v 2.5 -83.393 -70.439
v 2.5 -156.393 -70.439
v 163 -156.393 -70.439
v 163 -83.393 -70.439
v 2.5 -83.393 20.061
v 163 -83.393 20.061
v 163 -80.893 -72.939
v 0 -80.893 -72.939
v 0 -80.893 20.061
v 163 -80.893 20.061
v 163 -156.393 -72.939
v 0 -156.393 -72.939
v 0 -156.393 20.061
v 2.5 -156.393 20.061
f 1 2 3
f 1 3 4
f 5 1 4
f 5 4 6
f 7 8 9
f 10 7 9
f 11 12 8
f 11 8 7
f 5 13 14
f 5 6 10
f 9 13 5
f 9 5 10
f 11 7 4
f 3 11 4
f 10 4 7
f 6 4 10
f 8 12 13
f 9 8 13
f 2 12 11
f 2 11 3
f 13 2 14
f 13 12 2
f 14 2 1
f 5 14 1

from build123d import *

# Parameters (mm, degrees)
F0_W     = 78
F0_H     = 93
F1_DEPTH = 163
F2_T     = -2.5
F3_DEPTH = 2.5
F4_DEPTH = 2.5
F5_DEPTH = 25


with BuildPart() as f1:
    # F0 (on Right) → F1 (new body)
    with BuildSketch(Plane.YZ):
        with Locations((-119.8926544255, -26.4388019443)):
            Rectangle(F0_W, F0_H)
    extrude(amount=F1_DEPTH)

    # F2
    f2_openings = [f1.faces().sort_by_distance(p)[0] for p in [
        (81.5, -119.892654, 20.061198),
    ]]
    offset(amount=F2_T, openings=f2_openings)

    # F3 (add): a face of the model
    f3_faces = [f1.faces().sort_by_distance(p)[0] for p in [
        (81.5, -158.8926544255, -26.4388019443),
    ]]
    extrude(f3_faces, amount=-F3_DEPTH)

    # F4 (cut): a face of the model
    f4_faces = [f1.faces().sort_by_distance(p)[0] for p in [
        (81.5, -158.8926544255, -26.4388019443),
    ]]
    extrude(f4_faces, amount=-F4_DEPTH, mode=Mode.SUBTRACT)

    # F5 (cut): a face of the model
    f5_faces = [f1.faces().sort_by_distance(p)[0] for p in [
        (160.5, -119.8926544255, -25.1888019443),
    ]]
    extrude(f5_faces, amount=-F5_DEPTH, mode=Mode.SUBTRACT)


solid = f1.part
